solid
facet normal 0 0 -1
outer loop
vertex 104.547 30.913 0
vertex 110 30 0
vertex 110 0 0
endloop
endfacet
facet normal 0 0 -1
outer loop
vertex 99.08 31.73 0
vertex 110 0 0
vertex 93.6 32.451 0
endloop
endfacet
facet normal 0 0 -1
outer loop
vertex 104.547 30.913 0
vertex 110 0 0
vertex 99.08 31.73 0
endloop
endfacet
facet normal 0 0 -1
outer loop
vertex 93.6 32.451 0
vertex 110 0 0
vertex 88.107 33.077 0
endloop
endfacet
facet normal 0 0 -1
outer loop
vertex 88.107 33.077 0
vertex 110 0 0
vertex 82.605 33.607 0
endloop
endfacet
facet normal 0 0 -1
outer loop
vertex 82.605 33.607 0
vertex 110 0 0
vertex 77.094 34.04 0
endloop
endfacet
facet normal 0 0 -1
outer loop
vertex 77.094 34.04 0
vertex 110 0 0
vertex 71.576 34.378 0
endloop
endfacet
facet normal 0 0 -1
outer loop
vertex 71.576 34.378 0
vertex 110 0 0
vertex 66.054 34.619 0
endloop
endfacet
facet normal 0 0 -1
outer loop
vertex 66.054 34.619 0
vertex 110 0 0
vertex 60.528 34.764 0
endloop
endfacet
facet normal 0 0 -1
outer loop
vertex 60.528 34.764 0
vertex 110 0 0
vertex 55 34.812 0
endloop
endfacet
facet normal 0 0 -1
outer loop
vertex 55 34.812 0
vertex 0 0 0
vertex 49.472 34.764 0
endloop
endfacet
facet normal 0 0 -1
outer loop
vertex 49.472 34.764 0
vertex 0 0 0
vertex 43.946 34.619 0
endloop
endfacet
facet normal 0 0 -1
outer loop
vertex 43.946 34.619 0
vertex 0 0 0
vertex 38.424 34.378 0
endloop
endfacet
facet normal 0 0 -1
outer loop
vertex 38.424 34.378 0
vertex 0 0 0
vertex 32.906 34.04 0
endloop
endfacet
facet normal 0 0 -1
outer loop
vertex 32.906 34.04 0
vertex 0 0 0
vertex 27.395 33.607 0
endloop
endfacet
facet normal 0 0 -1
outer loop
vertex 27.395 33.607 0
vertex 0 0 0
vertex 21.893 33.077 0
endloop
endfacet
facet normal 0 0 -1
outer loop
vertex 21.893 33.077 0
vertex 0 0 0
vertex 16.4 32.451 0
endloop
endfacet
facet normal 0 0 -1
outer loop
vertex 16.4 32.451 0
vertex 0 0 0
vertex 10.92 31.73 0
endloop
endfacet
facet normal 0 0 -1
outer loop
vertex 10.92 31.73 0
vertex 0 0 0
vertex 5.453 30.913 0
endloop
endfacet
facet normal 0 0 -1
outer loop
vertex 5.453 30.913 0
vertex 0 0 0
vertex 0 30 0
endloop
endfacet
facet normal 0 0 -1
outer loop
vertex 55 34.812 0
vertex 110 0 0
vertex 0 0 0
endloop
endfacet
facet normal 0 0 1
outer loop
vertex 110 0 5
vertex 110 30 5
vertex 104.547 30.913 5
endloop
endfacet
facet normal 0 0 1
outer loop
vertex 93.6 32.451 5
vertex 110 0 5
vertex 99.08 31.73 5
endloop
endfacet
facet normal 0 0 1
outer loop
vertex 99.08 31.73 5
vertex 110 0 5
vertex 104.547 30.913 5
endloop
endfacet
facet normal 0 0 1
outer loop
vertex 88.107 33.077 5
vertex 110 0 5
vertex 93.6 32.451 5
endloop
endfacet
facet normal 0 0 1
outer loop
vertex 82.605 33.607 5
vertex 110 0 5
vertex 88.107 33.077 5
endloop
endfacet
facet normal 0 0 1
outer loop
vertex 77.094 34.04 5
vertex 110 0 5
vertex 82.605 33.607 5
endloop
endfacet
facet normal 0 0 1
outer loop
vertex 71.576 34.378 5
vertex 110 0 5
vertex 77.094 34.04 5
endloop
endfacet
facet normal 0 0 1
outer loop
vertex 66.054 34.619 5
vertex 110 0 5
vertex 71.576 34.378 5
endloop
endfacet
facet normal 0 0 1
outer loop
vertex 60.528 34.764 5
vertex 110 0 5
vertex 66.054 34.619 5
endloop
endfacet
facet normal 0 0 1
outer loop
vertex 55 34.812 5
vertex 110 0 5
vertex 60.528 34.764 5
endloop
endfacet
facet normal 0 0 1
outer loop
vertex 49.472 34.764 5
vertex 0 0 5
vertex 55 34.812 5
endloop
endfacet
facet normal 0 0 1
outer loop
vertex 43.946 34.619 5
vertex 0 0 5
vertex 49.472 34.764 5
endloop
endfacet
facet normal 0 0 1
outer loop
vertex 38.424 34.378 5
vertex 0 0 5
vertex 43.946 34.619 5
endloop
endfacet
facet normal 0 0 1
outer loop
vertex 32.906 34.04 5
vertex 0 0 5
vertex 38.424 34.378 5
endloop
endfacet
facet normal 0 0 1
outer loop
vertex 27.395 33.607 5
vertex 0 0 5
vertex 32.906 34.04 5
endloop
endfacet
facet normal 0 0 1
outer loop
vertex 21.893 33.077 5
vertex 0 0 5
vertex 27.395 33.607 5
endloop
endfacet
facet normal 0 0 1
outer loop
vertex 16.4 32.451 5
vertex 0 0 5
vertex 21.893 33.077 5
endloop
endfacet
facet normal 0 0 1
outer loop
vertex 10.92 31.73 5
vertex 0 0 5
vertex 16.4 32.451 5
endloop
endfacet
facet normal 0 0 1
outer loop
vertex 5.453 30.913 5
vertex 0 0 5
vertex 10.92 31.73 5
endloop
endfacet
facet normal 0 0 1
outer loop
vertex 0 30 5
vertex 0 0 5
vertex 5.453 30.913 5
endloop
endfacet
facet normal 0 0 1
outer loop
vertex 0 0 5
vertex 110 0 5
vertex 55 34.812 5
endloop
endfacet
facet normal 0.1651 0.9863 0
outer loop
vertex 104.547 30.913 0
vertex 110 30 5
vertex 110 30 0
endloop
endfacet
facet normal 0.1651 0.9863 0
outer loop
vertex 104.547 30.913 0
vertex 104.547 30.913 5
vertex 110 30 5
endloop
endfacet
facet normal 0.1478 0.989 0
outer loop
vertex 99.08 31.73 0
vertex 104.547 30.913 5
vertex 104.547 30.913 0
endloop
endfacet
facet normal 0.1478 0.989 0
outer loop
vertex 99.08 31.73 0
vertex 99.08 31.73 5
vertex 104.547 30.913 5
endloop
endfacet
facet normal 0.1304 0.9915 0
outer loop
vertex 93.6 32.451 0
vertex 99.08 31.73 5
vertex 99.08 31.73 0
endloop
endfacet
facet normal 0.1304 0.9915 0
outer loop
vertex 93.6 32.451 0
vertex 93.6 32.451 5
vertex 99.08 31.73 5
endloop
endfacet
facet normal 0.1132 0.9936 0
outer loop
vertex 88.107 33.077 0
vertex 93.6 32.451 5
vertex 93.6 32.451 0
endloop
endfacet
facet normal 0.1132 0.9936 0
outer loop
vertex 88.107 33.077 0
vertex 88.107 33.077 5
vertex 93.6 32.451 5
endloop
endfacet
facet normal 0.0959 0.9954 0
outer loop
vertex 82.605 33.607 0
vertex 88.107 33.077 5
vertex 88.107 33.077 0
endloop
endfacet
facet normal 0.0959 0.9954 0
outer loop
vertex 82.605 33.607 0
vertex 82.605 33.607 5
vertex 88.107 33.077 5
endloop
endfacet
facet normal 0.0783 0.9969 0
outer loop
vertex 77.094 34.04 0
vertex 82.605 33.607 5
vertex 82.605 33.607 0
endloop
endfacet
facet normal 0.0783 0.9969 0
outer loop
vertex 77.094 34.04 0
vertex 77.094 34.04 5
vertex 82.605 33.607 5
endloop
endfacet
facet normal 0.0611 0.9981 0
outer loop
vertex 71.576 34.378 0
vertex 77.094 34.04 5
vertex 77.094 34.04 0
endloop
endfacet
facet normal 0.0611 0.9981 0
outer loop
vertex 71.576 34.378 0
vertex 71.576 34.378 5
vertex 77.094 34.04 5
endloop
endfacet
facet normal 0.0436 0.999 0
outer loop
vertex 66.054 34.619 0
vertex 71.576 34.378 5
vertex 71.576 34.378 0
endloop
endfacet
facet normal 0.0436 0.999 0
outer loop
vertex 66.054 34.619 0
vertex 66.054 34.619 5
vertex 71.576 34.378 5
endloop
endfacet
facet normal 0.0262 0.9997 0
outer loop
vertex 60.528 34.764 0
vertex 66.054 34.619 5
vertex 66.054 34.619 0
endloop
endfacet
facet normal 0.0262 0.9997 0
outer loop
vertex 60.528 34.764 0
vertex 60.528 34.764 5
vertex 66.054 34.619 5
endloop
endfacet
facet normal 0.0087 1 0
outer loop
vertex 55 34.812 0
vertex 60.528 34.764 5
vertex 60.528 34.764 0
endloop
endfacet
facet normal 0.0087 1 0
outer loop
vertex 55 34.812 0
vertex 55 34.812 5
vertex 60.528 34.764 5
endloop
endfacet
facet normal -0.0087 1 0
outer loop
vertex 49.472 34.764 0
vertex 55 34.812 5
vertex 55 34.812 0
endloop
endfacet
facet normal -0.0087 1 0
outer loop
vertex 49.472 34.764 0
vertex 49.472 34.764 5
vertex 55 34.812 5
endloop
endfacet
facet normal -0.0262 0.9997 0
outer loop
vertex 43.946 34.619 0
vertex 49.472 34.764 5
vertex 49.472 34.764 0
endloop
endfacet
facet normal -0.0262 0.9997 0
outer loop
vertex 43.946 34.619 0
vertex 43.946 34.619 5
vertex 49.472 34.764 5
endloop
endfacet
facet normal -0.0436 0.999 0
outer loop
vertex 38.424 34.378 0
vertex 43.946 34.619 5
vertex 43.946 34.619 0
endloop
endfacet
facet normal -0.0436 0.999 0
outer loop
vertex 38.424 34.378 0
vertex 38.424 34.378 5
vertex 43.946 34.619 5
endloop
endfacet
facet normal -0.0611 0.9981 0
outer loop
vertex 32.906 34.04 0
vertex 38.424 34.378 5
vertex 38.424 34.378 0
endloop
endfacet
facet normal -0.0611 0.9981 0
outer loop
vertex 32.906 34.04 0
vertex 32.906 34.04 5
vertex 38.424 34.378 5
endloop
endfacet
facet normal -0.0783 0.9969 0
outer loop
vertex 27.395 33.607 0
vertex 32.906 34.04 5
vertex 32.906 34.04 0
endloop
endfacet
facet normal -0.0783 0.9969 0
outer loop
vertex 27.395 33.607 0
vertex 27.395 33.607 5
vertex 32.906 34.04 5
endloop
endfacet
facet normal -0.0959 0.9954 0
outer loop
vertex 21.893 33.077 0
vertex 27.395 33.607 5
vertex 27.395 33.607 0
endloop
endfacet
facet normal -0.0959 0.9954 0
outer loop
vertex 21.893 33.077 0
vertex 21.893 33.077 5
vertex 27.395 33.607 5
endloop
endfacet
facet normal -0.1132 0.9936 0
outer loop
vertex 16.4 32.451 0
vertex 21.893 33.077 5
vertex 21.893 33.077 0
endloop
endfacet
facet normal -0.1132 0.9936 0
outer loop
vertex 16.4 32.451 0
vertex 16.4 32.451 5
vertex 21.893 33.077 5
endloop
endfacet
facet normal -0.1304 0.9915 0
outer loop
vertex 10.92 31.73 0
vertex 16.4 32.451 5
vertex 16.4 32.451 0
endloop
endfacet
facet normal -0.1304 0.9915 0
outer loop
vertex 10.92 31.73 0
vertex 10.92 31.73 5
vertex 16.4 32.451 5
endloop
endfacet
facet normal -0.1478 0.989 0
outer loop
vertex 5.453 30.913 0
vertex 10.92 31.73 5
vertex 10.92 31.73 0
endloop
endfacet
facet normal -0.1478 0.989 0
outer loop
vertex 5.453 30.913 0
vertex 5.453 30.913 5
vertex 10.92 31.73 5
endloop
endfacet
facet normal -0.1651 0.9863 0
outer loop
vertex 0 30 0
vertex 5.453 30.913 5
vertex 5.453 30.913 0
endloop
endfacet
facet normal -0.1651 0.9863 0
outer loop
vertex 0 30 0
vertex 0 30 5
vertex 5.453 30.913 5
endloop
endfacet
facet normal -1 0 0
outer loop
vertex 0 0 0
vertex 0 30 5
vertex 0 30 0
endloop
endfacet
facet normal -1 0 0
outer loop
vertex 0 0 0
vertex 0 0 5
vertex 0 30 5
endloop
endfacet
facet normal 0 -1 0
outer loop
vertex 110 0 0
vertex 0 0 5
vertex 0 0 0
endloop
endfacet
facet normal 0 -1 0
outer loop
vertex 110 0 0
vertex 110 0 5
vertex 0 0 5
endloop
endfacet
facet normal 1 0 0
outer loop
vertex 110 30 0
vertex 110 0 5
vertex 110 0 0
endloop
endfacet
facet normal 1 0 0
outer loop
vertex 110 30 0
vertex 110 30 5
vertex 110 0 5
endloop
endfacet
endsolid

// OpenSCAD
$fn = 32;

// ----------------------------------------------------------------------
// Arc profile plate: crown, 23 points
// ----------------------------------------------------------------------

// --- parameters (mm) ---
bar_l = 110;              // bar length, X
bar_w = 30;               // bar height at the ends, Y
arc_r = 316.73;           // radius of the crown arc
arc_angle = 20;           // crown arc angle, degrees
crown_rise = 4.81;        // rise of the crown over the ends
arc_step = 1;             // sampling step of the crown arc, degrees
plate_t = 5;              // plate thickness, Z

bbox_y = bar_w + crown_rise;  // full height with the crown

profile = [[110, 30], [104.547, 30.913], [99.08, 31.73], [93.6, 32.451], [88.107, 33.077], [82.605, 33.607], [77.094, 34.04], [71.576, 34.378], [66.054, 34.619], [60.528, 34.764], [55, 34.812], [49.472, 34.764], [43.946, 34.619], [38.424, 34.378], [32.906, 34.04], [27.395, 33.607], [21.893, 33.077], [16.4, 32.451], [10.92, 31.73], [5.453, 30.913], [0, 30], [0, 0], [110, 0]];  // primary outline, 23 points, counter clockwise

// --- the one profile operation ---
linear_extrude(height = plate_t) polygon(points = profile);
